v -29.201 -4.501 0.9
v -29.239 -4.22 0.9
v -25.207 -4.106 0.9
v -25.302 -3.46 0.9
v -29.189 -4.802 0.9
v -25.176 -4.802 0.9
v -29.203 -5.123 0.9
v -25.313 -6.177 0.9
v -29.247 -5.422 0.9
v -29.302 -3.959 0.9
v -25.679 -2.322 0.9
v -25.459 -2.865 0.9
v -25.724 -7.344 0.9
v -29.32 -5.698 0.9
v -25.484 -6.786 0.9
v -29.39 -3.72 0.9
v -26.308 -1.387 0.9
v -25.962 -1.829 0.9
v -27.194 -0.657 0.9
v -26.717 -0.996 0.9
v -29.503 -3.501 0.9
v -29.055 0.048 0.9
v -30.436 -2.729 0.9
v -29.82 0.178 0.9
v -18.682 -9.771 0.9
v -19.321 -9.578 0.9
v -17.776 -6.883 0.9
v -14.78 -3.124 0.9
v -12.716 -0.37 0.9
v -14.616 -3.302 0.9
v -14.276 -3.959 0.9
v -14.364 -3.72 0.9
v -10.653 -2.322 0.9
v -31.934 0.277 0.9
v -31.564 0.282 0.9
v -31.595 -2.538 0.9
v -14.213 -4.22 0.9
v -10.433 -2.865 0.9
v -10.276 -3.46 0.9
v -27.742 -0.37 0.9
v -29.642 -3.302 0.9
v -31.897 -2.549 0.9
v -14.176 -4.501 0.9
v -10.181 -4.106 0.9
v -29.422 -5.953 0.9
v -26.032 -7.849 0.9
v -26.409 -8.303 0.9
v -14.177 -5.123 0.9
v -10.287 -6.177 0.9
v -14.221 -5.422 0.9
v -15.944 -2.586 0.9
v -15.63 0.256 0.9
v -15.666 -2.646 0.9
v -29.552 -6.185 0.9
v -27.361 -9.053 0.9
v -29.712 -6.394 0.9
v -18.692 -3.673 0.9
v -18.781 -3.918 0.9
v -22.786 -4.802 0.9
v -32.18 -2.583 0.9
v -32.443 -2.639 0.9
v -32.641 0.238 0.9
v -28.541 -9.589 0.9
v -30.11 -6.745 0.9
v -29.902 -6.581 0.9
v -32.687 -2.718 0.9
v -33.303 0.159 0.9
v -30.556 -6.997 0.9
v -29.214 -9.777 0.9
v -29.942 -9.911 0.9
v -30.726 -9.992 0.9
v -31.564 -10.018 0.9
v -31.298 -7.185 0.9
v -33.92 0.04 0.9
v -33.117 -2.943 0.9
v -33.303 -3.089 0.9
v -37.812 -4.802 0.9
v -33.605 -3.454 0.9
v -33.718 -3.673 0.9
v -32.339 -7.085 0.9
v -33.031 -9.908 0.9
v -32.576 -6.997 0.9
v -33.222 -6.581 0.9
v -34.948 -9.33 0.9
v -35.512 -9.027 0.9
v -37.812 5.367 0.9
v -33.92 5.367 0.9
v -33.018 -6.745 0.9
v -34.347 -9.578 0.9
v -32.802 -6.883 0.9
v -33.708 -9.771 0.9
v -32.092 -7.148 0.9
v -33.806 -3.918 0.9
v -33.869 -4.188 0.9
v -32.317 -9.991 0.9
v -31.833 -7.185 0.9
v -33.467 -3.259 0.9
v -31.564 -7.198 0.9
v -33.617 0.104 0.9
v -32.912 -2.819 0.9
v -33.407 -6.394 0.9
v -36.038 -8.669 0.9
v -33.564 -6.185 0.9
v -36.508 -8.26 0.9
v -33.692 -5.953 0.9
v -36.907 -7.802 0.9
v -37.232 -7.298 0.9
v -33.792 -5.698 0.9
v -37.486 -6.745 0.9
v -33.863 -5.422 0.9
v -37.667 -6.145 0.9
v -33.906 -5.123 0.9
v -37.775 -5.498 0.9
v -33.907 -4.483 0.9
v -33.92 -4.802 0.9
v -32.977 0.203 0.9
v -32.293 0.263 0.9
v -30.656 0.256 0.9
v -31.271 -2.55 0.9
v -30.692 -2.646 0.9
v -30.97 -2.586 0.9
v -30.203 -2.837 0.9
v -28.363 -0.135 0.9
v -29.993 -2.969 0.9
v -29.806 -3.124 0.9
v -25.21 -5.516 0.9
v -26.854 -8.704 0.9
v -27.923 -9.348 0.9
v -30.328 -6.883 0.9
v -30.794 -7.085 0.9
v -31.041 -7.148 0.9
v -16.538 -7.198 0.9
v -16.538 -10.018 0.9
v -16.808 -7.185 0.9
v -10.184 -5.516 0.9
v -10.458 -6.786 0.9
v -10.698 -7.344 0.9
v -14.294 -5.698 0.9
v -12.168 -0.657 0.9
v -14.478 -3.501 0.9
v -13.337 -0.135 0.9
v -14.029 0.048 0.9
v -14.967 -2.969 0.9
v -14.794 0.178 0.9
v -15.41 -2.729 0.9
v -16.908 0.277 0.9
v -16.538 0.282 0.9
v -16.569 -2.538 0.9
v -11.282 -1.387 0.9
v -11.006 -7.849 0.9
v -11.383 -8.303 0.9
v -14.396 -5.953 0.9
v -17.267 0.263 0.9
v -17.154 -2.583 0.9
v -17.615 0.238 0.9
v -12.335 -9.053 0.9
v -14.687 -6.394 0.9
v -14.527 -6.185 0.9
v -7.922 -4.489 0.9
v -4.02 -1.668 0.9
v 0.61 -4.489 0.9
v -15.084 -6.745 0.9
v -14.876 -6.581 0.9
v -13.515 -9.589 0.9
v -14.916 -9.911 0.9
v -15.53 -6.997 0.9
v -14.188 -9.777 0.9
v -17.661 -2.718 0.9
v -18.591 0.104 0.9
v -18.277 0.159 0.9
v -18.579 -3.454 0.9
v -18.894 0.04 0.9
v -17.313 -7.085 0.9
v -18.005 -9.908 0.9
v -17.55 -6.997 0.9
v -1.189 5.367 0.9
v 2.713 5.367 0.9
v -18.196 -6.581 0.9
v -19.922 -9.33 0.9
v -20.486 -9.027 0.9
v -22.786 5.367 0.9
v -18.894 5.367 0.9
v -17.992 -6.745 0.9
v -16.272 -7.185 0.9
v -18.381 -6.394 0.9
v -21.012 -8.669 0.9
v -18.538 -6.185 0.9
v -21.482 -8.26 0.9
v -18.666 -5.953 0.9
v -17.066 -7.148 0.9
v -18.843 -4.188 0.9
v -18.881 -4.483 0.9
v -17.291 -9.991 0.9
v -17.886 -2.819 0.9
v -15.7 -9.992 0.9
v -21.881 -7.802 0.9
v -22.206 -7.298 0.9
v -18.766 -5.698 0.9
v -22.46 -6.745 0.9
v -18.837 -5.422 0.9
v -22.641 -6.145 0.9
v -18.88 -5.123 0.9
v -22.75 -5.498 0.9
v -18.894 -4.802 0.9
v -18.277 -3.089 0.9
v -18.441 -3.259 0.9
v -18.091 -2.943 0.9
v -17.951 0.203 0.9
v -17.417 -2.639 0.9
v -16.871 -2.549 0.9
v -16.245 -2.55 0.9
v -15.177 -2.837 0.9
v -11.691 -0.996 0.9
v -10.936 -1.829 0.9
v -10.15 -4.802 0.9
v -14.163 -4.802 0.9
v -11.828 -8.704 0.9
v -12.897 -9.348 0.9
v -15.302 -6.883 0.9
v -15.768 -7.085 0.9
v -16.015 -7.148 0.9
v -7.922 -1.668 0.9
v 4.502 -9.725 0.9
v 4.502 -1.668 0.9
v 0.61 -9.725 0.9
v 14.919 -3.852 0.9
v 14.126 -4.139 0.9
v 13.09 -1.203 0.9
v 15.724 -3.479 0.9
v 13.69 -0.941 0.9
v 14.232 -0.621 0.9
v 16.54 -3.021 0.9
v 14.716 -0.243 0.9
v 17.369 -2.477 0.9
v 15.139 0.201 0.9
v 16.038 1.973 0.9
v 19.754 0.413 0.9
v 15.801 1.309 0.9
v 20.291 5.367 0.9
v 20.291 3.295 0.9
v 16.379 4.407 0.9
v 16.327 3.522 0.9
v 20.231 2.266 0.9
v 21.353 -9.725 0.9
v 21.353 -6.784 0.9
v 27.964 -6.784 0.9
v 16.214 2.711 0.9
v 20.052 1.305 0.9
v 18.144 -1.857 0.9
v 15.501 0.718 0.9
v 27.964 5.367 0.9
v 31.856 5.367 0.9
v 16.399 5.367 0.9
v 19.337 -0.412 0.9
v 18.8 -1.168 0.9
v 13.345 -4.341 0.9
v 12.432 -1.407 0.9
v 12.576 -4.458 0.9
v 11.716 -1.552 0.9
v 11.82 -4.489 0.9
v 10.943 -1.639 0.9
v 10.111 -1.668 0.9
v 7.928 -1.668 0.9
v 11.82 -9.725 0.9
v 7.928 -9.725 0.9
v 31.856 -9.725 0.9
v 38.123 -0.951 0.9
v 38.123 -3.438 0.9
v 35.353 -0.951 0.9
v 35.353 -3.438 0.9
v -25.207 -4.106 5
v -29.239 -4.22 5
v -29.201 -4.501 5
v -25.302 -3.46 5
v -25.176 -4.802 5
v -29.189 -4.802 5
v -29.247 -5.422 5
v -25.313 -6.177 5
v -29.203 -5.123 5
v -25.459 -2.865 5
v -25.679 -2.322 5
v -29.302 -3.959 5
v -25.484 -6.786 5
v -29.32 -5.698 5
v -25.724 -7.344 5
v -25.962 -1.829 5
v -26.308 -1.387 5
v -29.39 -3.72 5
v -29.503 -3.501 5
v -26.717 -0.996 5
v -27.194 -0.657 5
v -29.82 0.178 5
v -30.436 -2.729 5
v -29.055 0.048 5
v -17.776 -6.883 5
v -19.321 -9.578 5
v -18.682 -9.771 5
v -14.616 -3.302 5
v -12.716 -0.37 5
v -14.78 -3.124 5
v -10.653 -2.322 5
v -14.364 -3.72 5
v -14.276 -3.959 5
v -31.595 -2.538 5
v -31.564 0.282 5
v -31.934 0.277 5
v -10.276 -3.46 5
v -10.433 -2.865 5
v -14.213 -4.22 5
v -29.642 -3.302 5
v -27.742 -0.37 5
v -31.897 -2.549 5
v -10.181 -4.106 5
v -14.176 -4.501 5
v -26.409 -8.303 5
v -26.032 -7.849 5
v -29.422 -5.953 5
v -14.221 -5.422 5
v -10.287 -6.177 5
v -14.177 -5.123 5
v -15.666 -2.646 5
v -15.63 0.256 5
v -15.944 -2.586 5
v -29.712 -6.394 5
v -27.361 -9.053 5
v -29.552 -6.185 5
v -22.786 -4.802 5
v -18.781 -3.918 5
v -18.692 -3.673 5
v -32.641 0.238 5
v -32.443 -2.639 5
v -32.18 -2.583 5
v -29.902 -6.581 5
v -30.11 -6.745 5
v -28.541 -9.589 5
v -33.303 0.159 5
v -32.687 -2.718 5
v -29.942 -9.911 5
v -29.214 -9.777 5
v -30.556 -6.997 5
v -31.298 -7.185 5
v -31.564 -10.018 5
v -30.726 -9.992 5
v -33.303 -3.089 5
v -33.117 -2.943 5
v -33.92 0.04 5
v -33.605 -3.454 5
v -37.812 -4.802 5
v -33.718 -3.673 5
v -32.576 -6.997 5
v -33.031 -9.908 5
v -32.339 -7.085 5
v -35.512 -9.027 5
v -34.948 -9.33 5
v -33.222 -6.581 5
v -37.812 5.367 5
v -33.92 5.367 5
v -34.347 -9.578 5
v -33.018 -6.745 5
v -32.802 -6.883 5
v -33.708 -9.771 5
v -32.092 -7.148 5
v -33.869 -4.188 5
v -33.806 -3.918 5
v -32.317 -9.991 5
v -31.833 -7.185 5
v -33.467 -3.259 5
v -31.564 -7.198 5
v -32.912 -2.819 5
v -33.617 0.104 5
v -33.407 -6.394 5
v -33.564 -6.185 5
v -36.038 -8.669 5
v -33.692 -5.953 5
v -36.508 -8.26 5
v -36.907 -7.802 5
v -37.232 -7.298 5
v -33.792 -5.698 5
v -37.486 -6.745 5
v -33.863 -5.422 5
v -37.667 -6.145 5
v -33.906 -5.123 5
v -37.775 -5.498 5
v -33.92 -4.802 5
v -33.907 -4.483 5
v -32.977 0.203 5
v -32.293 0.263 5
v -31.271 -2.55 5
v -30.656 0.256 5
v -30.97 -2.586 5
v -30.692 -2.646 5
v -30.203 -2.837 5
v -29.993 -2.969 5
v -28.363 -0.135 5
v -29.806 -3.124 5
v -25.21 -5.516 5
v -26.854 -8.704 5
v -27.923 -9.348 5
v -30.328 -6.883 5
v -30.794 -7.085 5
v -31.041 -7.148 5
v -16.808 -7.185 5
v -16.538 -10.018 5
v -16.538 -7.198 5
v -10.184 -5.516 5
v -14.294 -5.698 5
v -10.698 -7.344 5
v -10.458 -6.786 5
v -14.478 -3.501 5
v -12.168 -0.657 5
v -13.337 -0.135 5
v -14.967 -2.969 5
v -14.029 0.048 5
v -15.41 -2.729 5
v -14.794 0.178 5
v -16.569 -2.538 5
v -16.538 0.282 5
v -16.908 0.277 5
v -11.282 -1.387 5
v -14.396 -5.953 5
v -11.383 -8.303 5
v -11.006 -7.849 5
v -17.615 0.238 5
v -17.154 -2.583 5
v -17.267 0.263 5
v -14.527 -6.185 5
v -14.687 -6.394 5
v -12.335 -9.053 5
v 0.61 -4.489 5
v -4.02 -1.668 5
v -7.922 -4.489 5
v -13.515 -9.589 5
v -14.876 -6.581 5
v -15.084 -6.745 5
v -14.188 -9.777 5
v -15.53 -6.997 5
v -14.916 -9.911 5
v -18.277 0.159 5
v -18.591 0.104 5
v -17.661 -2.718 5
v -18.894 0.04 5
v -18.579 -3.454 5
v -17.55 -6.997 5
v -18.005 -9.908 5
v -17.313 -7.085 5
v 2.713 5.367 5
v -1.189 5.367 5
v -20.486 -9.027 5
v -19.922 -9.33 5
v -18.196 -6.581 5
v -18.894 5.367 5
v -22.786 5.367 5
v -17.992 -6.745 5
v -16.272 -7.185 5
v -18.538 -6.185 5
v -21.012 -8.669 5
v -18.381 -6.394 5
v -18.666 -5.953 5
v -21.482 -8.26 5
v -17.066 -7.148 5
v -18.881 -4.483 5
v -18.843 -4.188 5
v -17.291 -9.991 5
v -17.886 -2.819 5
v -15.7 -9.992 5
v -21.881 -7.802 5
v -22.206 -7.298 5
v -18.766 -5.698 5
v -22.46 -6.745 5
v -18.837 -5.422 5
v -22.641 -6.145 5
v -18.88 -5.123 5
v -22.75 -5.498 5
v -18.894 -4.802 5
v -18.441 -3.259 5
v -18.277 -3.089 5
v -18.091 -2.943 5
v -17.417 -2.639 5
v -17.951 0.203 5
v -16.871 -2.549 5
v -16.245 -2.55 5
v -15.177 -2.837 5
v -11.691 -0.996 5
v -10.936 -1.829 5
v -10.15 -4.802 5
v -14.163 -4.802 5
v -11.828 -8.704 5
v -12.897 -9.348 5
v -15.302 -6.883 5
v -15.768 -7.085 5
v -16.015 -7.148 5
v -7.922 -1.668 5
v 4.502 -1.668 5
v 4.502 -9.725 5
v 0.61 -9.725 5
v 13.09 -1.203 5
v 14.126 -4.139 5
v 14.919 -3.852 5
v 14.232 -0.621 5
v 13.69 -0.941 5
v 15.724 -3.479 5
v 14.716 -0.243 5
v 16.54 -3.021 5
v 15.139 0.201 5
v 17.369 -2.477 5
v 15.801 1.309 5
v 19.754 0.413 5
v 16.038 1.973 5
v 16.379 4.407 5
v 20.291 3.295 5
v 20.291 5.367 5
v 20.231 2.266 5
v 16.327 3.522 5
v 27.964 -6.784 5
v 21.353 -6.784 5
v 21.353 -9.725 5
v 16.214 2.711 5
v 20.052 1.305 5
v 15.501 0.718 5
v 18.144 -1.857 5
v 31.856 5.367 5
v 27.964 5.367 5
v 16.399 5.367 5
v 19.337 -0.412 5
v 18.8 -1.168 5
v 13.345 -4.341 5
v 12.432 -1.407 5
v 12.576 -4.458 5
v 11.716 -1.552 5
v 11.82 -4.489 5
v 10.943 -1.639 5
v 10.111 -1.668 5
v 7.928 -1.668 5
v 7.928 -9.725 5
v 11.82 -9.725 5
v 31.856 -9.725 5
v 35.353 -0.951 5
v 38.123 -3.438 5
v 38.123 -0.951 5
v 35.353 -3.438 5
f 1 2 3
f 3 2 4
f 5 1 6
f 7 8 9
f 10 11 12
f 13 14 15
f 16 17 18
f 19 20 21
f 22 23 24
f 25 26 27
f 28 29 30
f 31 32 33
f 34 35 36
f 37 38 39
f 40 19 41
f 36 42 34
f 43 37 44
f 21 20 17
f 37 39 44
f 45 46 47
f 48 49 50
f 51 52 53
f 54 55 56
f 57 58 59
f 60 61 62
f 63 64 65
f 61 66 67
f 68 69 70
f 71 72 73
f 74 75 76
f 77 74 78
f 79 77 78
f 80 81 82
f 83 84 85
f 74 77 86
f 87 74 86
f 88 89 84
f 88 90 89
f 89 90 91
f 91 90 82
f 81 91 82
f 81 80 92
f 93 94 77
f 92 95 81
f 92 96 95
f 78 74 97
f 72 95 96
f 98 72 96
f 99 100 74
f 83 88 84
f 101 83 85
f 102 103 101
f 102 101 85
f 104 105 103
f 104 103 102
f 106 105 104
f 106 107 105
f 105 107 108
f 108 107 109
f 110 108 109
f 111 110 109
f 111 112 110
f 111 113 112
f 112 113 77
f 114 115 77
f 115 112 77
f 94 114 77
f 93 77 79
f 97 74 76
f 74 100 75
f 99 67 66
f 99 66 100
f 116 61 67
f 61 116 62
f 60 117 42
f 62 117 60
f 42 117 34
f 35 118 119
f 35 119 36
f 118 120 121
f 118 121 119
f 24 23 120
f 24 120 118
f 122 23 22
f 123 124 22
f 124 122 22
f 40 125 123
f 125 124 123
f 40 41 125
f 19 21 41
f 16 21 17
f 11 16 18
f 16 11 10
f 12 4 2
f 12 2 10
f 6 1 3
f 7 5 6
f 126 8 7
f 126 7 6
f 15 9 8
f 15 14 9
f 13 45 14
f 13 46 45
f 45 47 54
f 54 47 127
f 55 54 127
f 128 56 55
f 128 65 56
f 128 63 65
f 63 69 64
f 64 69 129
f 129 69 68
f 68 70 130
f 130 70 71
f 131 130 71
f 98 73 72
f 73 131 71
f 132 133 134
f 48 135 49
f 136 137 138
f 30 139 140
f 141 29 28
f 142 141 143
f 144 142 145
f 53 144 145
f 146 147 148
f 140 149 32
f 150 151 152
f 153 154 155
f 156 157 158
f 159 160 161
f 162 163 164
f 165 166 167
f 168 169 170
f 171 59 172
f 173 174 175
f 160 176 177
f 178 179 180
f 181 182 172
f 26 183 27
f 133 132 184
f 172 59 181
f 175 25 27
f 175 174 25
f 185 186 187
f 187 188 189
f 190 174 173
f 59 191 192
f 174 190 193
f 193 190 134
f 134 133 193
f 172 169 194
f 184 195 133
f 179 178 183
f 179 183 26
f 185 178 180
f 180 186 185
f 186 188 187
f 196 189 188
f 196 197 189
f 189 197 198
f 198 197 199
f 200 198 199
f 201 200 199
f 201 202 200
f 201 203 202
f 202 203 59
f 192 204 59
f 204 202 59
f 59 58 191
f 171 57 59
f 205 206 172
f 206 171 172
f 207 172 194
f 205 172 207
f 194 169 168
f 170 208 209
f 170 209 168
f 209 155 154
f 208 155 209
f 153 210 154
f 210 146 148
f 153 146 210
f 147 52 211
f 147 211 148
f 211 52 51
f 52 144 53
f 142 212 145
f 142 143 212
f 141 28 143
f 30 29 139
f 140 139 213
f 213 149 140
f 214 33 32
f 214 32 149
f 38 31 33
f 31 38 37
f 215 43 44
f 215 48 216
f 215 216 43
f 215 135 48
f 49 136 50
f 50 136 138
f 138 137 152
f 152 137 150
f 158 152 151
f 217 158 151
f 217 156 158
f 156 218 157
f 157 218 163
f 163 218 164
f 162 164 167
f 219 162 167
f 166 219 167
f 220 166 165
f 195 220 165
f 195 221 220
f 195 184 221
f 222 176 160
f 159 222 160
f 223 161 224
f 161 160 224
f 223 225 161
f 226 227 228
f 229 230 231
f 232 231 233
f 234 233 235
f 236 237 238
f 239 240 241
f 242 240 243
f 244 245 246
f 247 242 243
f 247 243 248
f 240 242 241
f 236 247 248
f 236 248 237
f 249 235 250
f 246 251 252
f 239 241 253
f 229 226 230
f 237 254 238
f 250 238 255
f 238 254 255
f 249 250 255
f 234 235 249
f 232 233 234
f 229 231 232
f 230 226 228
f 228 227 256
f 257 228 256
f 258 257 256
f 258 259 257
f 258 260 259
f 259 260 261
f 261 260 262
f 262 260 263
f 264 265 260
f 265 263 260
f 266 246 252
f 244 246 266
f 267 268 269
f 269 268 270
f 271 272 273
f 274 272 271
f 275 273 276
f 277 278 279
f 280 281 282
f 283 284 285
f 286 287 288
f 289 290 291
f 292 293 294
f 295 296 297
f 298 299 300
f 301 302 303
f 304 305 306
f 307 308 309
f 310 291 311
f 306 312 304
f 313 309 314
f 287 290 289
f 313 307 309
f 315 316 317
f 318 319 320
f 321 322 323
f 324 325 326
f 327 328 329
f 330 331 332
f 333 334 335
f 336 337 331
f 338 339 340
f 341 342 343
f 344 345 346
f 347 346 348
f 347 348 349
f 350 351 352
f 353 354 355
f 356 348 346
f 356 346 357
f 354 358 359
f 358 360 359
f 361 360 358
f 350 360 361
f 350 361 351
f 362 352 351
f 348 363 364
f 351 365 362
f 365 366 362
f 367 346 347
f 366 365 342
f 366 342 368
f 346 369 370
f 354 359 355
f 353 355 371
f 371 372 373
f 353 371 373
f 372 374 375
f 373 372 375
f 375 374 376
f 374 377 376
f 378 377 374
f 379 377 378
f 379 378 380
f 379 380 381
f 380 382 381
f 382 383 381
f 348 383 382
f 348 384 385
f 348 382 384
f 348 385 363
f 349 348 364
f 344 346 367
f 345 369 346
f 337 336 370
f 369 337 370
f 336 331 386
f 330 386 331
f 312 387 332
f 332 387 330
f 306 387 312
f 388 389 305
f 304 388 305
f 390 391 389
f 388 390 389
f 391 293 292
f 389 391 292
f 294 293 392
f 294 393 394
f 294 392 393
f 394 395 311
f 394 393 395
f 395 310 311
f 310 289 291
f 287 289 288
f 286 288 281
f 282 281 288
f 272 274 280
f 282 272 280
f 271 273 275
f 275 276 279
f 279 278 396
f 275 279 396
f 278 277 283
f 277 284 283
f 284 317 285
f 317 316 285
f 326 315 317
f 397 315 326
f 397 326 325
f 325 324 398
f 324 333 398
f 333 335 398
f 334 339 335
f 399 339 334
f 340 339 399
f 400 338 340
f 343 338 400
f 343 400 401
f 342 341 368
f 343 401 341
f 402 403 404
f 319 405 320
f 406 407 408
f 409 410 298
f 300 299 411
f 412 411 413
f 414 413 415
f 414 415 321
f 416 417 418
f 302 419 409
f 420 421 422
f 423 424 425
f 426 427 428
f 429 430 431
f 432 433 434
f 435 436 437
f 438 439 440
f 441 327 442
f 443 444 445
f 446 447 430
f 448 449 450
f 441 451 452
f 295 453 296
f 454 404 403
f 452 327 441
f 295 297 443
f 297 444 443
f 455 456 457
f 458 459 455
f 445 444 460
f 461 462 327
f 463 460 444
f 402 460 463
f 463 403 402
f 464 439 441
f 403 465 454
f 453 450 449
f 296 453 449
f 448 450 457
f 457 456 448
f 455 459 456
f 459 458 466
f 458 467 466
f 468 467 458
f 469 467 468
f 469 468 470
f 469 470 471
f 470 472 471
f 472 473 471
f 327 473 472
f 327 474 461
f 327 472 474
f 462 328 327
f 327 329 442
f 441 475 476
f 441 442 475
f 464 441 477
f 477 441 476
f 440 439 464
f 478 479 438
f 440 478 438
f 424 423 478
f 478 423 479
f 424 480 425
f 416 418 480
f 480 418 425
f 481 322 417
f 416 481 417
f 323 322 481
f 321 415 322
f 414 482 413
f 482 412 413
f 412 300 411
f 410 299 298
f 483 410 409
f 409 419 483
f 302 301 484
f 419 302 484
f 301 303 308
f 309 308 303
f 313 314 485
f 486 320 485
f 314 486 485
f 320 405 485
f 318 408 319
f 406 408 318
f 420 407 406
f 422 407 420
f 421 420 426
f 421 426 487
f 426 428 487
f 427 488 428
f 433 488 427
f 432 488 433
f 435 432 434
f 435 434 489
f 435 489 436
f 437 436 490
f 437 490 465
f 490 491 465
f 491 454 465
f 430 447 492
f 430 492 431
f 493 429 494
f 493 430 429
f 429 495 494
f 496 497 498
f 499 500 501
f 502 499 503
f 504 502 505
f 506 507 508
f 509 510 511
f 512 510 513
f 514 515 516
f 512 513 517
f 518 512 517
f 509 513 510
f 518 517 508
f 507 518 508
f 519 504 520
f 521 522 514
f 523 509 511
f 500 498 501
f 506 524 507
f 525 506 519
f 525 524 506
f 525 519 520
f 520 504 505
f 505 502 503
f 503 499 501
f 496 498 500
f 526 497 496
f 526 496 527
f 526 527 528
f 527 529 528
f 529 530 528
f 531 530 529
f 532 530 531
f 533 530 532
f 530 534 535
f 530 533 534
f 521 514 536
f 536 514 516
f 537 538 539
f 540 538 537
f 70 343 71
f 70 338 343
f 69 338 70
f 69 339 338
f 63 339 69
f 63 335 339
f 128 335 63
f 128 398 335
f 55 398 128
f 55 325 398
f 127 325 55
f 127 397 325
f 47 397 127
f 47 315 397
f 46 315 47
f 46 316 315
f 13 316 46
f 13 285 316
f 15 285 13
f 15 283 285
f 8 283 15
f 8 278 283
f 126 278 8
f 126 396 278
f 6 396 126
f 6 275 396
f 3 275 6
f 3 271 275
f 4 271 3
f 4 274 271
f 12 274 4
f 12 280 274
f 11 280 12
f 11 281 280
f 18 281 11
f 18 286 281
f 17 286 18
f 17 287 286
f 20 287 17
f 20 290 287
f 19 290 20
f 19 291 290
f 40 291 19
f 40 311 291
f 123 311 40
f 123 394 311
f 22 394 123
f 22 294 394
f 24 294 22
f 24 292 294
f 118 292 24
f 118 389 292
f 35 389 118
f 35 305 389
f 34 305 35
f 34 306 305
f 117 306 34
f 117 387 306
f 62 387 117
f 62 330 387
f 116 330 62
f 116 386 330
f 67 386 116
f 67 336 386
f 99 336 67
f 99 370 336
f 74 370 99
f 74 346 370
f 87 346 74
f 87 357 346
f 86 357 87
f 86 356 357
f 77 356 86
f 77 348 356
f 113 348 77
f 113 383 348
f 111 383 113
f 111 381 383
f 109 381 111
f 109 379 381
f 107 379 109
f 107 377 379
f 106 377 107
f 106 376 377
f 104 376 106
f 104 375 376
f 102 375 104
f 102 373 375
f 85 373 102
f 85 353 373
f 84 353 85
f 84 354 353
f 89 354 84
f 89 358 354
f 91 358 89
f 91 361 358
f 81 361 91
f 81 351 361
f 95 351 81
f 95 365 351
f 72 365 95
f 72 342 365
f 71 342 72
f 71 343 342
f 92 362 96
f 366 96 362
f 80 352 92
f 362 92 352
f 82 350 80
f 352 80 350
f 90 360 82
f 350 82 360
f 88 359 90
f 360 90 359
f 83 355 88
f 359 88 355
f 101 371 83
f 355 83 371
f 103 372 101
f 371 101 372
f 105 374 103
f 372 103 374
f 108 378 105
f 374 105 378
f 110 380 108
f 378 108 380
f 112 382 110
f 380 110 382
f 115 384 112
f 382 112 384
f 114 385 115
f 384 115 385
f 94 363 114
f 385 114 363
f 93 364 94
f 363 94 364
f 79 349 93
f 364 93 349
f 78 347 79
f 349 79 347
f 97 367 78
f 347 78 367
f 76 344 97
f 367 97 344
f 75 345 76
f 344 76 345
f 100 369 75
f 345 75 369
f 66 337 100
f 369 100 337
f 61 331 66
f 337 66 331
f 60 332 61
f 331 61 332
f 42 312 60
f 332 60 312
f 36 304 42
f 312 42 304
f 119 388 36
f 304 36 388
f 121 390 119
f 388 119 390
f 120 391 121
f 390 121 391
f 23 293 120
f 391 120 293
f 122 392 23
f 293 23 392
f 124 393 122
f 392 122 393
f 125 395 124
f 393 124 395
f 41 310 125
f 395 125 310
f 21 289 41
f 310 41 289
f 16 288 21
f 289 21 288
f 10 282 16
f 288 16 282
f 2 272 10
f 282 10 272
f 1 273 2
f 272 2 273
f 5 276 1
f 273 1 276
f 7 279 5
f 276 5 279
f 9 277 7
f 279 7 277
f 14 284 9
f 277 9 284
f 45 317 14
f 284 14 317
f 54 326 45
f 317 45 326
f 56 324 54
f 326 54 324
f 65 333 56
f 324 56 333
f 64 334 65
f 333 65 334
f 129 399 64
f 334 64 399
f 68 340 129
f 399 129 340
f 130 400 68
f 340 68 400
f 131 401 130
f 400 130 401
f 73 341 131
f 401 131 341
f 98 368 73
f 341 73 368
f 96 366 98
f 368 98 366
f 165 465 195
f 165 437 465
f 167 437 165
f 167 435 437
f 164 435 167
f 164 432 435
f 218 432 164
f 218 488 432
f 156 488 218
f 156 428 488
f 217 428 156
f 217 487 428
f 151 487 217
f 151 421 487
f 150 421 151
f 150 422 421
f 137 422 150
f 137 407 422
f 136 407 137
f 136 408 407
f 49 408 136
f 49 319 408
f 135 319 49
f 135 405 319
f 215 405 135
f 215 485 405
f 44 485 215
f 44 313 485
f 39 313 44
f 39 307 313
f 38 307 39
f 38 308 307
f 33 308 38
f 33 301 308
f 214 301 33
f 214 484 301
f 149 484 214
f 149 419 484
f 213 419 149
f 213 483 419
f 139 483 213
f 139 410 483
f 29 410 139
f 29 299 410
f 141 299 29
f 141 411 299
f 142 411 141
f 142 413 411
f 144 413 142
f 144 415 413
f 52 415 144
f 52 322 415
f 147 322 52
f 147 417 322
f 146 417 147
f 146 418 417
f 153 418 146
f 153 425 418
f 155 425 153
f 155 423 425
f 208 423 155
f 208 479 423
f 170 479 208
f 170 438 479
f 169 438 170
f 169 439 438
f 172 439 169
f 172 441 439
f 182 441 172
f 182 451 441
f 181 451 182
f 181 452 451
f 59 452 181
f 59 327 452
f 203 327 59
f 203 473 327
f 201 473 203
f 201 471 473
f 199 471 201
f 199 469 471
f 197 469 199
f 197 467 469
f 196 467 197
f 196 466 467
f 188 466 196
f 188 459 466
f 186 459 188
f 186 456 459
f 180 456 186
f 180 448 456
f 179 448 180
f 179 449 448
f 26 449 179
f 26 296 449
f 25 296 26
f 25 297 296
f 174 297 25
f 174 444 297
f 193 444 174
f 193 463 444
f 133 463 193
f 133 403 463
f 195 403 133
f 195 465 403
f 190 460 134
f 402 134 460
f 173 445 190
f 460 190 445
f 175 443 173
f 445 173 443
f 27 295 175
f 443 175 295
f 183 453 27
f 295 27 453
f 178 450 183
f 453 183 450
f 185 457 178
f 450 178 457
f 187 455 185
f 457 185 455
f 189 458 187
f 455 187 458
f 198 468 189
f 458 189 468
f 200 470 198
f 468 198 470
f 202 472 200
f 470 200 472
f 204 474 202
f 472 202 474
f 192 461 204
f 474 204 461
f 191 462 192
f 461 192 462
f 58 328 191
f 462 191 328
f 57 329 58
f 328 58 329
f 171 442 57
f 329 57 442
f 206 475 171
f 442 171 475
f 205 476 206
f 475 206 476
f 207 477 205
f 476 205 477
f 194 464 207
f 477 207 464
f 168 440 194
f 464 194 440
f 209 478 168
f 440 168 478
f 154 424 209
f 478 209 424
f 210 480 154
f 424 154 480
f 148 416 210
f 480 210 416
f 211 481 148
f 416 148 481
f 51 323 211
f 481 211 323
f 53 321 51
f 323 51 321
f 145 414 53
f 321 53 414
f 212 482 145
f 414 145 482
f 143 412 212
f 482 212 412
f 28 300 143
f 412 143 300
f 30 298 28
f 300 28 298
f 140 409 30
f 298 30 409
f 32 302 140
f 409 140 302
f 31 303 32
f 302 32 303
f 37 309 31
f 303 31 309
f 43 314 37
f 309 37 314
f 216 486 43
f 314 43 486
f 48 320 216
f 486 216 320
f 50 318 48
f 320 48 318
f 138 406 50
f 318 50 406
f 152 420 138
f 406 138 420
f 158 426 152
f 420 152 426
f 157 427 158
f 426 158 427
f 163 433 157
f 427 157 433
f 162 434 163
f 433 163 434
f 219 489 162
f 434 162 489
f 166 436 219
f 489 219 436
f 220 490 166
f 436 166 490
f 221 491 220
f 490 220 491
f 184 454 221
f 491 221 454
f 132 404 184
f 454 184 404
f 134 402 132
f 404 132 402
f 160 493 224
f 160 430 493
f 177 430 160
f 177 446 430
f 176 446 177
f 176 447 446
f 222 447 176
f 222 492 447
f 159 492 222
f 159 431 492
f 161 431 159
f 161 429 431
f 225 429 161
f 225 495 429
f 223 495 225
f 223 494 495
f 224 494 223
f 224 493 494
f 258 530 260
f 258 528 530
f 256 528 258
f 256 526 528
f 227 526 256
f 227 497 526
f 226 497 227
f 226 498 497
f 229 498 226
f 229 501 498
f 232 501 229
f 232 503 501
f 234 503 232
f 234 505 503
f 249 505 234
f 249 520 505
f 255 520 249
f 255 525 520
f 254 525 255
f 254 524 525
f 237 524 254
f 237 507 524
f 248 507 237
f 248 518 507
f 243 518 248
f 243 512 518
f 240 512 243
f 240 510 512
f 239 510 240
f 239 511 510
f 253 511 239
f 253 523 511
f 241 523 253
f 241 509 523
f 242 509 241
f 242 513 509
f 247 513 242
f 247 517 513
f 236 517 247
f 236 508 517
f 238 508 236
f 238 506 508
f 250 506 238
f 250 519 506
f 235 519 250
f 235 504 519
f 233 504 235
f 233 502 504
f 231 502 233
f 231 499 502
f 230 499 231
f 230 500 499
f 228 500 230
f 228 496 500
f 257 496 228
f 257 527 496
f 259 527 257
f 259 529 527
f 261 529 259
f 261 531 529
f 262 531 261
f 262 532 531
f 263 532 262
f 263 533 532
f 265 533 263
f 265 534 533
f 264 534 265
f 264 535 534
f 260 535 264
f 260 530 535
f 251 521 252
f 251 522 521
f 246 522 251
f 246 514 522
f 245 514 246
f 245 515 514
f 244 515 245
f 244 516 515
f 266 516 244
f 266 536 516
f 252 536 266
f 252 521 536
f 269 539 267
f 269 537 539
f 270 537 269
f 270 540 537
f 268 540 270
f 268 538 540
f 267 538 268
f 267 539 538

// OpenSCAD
$fn = 48;
  // syllabics (overlaid on icon, tallest)
  translate([0, -2.500, 0.900]) linear_extrude(height=4.100) text("ᑲᑲᔦᓯᒧᐧ", size=14.907, halign="center", valign="center", font="Euphemia UCAS:style=Bold");
